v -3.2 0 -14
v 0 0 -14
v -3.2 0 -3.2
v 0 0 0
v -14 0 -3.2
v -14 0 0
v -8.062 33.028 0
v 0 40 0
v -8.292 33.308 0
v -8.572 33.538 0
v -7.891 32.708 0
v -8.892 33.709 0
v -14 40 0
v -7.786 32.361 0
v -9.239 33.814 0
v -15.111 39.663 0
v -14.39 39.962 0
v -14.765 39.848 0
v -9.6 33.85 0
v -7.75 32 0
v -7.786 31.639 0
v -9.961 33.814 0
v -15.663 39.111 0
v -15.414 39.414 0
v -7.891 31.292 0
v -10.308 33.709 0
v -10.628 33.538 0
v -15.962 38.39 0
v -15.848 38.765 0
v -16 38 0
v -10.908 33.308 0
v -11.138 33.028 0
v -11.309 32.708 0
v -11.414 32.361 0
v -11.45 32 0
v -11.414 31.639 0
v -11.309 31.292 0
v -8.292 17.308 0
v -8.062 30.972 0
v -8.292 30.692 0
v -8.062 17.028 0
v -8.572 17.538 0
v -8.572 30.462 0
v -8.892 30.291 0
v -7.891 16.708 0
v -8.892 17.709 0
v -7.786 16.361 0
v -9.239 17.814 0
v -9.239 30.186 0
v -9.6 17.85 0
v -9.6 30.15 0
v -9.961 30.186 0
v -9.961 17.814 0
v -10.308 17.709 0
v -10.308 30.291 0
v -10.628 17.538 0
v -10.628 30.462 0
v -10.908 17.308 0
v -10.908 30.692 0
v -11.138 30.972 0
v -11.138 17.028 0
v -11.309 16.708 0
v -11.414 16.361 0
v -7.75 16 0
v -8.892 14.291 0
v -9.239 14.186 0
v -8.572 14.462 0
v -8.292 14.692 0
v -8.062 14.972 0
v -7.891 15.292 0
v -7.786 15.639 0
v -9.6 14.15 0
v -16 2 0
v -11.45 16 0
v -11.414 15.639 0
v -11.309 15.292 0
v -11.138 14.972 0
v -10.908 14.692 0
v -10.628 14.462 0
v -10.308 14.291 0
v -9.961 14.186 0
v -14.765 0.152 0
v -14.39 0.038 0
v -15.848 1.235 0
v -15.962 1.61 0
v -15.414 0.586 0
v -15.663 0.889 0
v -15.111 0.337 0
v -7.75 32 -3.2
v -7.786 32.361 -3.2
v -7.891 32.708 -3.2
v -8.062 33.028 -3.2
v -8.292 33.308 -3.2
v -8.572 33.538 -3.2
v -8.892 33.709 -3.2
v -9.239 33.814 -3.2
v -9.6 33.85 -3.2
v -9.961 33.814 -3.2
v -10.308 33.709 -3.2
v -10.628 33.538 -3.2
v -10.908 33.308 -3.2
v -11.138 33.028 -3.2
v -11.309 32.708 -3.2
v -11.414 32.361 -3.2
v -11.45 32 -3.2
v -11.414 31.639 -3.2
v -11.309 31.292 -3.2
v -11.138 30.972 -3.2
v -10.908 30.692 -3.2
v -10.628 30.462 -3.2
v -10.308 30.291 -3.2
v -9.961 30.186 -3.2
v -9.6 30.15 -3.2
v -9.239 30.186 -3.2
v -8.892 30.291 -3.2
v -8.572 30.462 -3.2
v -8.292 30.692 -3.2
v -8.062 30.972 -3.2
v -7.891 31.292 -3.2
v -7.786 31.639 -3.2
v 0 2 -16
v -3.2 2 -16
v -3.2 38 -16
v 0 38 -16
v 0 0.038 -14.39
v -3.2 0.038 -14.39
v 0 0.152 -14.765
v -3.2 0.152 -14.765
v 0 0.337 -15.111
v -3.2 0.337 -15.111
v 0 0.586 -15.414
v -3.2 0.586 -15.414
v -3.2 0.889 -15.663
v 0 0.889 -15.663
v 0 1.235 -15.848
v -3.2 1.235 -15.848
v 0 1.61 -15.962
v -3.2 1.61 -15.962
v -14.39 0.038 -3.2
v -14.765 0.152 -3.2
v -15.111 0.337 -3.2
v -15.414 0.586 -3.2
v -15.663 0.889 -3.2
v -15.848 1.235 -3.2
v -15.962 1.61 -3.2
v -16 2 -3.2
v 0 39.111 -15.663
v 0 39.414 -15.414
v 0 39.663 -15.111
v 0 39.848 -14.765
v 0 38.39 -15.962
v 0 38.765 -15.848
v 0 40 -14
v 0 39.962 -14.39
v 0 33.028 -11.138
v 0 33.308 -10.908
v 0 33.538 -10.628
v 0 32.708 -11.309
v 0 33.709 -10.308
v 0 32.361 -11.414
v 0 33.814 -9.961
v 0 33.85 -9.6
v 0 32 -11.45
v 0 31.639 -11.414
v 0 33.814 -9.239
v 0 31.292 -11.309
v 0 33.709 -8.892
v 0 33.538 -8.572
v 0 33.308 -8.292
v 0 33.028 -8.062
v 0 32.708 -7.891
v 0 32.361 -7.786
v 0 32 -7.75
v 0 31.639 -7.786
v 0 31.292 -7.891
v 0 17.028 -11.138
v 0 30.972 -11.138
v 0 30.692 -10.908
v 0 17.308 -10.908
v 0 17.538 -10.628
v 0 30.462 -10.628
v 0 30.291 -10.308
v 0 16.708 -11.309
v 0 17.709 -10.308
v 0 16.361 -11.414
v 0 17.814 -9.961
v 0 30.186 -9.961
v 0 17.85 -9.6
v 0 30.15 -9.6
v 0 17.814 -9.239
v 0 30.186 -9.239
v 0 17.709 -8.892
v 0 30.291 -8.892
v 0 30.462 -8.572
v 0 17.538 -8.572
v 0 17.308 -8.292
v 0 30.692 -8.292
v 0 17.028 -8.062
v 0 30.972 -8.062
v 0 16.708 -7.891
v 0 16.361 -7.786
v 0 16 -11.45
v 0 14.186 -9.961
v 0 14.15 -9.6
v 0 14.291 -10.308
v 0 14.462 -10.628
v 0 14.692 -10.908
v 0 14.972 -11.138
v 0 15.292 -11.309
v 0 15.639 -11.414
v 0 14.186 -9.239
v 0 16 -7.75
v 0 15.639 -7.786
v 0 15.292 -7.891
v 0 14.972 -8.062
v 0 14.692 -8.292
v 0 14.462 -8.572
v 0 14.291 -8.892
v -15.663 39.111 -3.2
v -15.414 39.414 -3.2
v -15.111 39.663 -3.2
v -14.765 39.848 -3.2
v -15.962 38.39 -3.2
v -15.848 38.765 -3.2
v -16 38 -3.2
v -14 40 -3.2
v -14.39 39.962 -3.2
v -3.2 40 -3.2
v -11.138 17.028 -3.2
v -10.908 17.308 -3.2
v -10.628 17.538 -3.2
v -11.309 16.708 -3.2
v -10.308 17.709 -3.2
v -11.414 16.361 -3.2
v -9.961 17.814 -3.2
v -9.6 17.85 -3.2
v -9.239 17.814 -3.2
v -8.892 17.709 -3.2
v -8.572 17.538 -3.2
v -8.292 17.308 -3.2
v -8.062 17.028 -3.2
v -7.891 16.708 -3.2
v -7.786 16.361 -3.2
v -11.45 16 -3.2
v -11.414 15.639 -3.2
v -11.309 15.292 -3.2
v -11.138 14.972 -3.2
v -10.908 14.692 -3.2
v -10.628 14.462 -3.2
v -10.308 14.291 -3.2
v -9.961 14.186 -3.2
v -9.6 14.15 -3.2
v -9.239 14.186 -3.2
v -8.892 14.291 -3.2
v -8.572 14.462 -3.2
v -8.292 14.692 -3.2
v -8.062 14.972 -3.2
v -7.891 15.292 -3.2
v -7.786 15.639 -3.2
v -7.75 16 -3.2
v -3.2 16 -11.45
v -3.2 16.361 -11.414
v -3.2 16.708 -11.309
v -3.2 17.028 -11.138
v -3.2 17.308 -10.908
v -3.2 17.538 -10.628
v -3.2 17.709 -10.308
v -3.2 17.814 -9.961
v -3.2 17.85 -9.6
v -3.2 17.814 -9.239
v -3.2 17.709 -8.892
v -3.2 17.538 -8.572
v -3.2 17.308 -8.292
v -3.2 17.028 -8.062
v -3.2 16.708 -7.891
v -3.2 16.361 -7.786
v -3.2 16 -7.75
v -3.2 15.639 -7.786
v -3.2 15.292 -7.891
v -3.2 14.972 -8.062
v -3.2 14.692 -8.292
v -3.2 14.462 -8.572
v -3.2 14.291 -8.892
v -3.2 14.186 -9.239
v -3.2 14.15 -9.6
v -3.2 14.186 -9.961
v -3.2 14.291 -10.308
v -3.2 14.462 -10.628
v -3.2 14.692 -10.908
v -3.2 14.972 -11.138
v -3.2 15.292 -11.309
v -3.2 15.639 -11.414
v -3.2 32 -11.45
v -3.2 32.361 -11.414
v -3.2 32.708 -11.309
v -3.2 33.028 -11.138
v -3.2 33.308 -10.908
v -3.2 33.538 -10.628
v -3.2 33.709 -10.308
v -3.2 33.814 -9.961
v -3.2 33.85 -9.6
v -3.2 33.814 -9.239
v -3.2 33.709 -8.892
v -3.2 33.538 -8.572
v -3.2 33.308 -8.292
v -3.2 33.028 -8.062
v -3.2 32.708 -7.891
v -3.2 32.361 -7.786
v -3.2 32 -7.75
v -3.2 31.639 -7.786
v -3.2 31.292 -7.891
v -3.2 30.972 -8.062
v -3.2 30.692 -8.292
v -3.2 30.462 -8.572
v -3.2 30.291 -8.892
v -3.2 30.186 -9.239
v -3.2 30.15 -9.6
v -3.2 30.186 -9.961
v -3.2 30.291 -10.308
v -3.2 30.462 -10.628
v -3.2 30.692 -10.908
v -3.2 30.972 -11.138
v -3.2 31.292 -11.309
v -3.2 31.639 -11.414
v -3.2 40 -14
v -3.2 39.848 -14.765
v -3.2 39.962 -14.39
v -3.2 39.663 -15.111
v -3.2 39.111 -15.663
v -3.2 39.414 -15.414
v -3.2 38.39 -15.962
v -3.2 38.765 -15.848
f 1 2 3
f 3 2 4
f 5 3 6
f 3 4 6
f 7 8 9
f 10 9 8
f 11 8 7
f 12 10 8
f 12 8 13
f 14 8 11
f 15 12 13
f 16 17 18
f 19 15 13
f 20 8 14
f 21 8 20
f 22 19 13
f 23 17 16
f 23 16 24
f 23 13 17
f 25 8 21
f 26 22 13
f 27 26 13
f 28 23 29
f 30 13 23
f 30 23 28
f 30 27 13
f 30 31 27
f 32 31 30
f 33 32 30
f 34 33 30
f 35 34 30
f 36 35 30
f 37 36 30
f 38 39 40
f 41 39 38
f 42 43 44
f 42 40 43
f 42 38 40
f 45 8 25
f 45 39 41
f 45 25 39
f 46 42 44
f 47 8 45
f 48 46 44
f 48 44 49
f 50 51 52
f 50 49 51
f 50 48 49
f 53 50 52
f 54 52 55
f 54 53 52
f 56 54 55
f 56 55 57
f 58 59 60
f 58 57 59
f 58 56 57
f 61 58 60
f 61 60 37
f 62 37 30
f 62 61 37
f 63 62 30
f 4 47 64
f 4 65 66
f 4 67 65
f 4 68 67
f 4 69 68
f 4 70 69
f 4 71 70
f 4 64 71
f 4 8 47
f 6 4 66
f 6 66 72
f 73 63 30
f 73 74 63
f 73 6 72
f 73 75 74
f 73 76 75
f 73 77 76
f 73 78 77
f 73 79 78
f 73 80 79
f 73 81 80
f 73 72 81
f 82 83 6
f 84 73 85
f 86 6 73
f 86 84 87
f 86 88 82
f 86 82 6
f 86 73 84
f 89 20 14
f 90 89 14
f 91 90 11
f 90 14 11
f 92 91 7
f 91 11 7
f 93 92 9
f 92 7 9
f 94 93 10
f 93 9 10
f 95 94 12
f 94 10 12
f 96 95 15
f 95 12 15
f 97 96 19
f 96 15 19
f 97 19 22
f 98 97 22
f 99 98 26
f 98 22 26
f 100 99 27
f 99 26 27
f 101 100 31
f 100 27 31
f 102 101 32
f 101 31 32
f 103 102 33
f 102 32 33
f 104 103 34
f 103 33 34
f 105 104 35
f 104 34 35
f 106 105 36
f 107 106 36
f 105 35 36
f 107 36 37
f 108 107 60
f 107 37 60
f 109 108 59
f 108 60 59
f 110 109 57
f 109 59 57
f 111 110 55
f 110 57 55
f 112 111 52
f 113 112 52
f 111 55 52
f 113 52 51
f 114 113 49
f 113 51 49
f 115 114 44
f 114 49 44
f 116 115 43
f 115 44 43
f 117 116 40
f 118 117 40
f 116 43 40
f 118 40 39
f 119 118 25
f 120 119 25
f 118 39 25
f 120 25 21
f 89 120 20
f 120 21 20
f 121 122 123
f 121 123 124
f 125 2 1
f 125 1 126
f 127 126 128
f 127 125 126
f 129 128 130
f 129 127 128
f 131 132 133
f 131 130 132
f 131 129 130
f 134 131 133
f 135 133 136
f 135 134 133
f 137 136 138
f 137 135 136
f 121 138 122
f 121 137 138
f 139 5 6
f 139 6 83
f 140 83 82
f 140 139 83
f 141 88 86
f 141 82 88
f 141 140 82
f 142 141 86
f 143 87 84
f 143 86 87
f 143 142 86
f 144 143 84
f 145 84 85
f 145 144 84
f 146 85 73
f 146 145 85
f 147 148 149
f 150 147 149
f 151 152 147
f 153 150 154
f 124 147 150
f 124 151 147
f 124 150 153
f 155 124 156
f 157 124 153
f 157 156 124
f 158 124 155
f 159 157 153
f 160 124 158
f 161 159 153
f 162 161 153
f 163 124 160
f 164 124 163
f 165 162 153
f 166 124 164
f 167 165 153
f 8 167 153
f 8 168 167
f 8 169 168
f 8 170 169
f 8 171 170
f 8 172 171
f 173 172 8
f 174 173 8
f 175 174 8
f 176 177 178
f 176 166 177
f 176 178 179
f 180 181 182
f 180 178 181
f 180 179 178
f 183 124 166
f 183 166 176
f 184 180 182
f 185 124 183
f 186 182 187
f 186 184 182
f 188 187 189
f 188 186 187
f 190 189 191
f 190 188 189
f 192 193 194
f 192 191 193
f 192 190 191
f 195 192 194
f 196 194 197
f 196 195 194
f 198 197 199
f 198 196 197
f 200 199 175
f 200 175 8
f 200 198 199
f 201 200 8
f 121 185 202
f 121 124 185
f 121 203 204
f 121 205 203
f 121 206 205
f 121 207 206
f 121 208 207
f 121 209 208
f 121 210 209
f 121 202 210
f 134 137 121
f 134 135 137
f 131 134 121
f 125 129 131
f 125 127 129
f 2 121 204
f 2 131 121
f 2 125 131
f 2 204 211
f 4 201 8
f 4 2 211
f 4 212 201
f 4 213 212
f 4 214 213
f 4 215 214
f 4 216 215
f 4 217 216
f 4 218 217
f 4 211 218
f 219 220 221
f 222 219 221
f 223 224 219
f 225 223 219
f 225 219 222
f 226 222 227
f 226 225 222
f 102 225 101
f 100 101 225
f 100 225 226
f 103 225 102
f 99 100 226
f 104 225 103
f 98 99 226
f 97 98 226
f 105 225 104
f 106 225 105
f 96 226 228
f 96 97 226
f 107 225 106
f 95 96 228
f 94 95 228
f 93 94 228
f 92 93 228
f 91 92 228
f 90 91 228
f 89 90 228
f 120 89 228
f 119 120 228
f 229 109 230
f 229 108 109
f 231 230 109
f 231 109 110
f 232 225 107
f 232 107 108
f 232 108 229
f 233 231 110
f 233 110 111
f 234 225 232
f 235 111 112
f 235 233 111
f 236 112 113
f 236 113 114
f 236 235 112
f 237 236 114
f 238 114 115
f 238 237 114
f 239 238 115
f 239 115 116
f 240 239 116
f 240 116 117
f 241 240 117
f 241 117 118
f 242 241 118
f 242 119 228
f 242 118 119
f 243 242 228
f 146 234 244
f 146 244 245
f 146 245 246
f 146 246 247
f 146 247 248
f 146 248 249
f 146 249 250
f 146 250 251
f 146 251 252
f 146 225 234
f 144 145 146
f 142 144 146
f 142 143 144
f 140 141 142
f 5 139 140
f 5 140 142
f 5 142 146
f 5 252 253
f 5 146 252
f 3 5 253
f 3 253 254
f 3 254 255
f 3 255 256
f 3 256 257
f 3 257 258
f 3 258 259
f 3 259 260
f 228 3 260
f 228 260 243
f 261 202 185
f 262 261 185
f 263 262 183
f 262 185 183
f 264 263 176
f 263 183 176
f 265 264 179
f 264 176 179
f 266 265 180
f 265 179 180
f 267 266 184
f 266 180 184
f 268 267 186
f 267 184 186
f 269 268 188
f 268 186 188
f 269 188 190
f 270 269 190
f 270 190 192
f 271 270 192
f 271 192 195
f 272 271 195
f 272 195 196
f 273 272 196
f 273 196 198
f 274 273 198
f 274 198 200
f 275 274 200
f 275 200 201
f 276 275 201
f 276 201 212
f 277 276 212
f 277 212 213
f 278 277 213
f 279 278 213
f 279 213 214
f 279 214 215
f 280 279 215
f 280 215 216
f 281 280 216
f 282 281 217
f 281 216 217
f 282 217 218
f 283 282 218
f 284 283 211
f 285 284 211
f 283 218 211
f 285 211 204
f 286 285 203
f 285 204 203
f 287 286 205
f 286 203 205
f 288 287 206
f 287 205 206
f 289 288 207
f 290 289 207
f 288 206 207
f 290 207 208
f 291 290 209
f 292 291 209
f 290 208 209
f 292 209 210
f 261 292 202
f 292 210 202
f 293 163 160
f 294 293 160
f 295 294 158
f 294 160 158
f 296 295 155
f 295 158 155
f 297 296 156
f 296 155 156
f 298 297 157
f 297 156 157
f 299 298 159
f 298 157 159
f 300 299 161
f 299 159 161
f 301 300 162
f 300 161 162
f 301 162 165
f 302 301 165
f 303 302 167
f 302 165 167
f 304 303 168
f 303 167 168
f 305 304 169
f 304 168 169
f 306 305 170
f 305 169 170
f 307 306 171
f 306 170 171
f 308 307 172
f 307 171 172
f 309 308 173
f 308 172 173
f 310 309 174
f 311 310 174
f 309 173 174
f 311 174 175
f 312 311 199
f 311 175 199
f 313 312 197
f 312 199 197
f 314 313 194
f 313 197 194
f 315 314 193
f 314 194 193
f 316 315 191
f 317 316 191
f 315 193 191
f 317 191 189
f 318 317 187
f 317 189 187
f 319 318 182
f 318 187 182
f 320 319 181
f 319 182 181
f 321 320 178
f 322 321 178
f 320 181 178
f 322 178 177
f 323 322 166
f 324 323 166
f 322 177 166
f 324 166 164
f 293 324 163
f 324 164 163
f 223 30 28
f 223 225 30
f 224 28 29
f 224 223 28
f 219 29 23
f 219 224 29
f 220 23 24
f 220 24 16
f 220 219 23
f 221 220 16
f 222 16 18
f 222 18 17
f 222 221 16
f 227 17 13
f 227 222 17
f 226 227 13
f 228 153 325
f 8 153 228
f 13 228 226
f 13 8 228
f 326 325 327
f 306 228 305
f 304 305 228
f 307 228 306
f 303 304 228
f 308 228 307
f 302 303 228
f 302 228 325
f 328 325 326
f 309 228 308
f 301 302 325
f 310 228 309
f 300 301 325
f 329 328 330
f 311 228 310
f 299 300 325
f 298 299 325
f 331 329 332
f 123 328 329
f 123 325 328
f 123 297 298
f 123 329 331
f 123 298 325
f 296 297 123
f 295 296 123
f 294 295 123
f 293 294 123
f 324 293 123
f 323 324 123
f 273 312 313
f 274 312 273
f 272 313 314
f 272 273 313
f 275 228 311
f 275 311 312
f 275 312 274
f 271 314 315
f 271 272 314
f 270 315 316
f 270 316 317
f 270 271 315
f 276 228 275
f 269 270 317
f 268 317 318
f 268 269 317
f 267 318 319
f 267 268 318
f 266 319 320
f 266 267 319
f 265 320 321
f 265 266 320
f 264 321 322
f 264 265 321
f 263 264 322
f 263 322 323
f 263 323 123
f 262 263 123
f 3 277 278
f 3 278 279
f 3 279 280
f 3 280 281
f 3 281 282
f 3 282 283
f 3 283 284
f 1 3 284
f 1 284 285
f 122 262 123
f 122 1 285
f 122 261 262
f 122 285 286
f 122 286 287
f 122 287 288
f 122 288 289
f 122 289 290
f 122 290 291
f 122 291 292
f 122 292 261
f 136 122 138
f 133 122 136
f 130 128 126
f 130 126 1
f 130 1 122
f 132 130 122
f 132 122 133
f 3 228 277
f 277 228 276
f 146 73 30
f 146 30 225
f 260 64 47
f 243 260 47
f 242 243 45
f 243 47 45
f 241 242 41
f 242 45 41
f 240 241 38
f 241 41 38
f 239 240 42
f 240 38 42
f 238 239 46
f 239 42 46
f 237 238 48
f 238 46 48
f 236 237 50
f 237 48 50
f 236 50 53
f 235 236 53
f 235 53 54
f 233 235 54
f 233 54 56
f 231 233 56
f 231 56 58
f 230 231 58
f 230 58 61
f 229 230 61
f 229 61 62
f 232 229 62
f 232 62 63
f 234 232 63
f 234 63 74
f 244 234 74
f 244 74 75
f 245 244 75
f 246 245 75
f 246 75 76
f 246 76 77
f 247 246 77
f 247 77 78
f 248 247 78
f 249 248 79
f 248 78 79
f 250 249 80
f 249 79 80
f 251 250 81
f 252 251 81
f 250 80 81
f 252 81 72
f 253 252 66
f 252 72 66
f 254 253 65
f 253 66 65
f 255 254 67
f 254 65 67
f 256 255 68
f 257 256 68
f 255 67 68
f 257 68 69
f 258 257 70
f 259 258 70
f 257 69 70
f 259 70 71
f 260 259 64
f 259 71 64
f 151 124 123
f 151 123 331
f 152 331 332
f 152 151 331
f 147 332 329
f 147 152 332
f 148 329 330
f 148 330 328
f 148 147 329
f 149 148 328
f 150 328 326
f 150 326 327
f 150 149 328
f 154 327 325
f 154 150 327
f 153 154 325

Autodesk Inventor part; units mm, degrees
ref_plane "YZ Plane" through (0, 0, 0) normal (1, 0, 0) x (0, 1, 0)
ref_plane "XZ Plane" through (0, 0, 0) normal (0, 1, 0) x (-1, 0, 0)
ref_plane "XY Plane" through (0, 0, 0) normal (0, 0, 1) x (1, 0, 0)
sketch "Sketch1" plane through (0, 0, 0) normal (0, 1, 0) x (-1, 0, 0)
  line L0 (0, 0) -> (16, 0)
  line L1 (16, 0) -> (16, -3.2)
  line L2 (16, -3.2) -> (3.2, -3.2)
  line L3 (0, -3.2) -> (0, 0)
  line L4 (0, 0) -> (3.2, 0)
  line L5 (3.2, -3.2) -> (3.2, -16)
  line L6 (3.2, -16) -> (0, -16)
  line L7 (0, -16) -> (0, 0)
  dimension "d0" = 16
  dimension "d1" = 3.2
  dimension "d2" = 3.2
  dimension "d3" = 16
extrude "Extrusion1" add sketch "Sketch1" along normal blind 40
fillet "Fillet1" radius 2 4 edges at (-1.6, 40, -16) (-16, 40, -1.6) (-1.6, 0, -16) (-16, 0, -1.6)
sketch "Sketch4" plane through (0, 0, 0) normal (1, 0, 0) x (0, 0, -1)
  circle A0 centre (9.6, 16) radius 1.85
  circle A1 centre (9.6, 32) radius 1.85
  point P0 (0, 0)
sketch "Sketch5" plane through (0, 0, 0) normal (0, 0, 1) x (1, 0, 0)
  circle A0 centre (-9.6, 16) radius 1.85
  circle A1 centre (-9.6, 32) radius 1.85
  point P0 (0, 0)
extrude "Extrusion4" cut sketch "Sketch4" against normal through all
extrude "Extrusion5" cut sketch "Sketch5" against normal through all
properties part number "wheelguardbracket"
